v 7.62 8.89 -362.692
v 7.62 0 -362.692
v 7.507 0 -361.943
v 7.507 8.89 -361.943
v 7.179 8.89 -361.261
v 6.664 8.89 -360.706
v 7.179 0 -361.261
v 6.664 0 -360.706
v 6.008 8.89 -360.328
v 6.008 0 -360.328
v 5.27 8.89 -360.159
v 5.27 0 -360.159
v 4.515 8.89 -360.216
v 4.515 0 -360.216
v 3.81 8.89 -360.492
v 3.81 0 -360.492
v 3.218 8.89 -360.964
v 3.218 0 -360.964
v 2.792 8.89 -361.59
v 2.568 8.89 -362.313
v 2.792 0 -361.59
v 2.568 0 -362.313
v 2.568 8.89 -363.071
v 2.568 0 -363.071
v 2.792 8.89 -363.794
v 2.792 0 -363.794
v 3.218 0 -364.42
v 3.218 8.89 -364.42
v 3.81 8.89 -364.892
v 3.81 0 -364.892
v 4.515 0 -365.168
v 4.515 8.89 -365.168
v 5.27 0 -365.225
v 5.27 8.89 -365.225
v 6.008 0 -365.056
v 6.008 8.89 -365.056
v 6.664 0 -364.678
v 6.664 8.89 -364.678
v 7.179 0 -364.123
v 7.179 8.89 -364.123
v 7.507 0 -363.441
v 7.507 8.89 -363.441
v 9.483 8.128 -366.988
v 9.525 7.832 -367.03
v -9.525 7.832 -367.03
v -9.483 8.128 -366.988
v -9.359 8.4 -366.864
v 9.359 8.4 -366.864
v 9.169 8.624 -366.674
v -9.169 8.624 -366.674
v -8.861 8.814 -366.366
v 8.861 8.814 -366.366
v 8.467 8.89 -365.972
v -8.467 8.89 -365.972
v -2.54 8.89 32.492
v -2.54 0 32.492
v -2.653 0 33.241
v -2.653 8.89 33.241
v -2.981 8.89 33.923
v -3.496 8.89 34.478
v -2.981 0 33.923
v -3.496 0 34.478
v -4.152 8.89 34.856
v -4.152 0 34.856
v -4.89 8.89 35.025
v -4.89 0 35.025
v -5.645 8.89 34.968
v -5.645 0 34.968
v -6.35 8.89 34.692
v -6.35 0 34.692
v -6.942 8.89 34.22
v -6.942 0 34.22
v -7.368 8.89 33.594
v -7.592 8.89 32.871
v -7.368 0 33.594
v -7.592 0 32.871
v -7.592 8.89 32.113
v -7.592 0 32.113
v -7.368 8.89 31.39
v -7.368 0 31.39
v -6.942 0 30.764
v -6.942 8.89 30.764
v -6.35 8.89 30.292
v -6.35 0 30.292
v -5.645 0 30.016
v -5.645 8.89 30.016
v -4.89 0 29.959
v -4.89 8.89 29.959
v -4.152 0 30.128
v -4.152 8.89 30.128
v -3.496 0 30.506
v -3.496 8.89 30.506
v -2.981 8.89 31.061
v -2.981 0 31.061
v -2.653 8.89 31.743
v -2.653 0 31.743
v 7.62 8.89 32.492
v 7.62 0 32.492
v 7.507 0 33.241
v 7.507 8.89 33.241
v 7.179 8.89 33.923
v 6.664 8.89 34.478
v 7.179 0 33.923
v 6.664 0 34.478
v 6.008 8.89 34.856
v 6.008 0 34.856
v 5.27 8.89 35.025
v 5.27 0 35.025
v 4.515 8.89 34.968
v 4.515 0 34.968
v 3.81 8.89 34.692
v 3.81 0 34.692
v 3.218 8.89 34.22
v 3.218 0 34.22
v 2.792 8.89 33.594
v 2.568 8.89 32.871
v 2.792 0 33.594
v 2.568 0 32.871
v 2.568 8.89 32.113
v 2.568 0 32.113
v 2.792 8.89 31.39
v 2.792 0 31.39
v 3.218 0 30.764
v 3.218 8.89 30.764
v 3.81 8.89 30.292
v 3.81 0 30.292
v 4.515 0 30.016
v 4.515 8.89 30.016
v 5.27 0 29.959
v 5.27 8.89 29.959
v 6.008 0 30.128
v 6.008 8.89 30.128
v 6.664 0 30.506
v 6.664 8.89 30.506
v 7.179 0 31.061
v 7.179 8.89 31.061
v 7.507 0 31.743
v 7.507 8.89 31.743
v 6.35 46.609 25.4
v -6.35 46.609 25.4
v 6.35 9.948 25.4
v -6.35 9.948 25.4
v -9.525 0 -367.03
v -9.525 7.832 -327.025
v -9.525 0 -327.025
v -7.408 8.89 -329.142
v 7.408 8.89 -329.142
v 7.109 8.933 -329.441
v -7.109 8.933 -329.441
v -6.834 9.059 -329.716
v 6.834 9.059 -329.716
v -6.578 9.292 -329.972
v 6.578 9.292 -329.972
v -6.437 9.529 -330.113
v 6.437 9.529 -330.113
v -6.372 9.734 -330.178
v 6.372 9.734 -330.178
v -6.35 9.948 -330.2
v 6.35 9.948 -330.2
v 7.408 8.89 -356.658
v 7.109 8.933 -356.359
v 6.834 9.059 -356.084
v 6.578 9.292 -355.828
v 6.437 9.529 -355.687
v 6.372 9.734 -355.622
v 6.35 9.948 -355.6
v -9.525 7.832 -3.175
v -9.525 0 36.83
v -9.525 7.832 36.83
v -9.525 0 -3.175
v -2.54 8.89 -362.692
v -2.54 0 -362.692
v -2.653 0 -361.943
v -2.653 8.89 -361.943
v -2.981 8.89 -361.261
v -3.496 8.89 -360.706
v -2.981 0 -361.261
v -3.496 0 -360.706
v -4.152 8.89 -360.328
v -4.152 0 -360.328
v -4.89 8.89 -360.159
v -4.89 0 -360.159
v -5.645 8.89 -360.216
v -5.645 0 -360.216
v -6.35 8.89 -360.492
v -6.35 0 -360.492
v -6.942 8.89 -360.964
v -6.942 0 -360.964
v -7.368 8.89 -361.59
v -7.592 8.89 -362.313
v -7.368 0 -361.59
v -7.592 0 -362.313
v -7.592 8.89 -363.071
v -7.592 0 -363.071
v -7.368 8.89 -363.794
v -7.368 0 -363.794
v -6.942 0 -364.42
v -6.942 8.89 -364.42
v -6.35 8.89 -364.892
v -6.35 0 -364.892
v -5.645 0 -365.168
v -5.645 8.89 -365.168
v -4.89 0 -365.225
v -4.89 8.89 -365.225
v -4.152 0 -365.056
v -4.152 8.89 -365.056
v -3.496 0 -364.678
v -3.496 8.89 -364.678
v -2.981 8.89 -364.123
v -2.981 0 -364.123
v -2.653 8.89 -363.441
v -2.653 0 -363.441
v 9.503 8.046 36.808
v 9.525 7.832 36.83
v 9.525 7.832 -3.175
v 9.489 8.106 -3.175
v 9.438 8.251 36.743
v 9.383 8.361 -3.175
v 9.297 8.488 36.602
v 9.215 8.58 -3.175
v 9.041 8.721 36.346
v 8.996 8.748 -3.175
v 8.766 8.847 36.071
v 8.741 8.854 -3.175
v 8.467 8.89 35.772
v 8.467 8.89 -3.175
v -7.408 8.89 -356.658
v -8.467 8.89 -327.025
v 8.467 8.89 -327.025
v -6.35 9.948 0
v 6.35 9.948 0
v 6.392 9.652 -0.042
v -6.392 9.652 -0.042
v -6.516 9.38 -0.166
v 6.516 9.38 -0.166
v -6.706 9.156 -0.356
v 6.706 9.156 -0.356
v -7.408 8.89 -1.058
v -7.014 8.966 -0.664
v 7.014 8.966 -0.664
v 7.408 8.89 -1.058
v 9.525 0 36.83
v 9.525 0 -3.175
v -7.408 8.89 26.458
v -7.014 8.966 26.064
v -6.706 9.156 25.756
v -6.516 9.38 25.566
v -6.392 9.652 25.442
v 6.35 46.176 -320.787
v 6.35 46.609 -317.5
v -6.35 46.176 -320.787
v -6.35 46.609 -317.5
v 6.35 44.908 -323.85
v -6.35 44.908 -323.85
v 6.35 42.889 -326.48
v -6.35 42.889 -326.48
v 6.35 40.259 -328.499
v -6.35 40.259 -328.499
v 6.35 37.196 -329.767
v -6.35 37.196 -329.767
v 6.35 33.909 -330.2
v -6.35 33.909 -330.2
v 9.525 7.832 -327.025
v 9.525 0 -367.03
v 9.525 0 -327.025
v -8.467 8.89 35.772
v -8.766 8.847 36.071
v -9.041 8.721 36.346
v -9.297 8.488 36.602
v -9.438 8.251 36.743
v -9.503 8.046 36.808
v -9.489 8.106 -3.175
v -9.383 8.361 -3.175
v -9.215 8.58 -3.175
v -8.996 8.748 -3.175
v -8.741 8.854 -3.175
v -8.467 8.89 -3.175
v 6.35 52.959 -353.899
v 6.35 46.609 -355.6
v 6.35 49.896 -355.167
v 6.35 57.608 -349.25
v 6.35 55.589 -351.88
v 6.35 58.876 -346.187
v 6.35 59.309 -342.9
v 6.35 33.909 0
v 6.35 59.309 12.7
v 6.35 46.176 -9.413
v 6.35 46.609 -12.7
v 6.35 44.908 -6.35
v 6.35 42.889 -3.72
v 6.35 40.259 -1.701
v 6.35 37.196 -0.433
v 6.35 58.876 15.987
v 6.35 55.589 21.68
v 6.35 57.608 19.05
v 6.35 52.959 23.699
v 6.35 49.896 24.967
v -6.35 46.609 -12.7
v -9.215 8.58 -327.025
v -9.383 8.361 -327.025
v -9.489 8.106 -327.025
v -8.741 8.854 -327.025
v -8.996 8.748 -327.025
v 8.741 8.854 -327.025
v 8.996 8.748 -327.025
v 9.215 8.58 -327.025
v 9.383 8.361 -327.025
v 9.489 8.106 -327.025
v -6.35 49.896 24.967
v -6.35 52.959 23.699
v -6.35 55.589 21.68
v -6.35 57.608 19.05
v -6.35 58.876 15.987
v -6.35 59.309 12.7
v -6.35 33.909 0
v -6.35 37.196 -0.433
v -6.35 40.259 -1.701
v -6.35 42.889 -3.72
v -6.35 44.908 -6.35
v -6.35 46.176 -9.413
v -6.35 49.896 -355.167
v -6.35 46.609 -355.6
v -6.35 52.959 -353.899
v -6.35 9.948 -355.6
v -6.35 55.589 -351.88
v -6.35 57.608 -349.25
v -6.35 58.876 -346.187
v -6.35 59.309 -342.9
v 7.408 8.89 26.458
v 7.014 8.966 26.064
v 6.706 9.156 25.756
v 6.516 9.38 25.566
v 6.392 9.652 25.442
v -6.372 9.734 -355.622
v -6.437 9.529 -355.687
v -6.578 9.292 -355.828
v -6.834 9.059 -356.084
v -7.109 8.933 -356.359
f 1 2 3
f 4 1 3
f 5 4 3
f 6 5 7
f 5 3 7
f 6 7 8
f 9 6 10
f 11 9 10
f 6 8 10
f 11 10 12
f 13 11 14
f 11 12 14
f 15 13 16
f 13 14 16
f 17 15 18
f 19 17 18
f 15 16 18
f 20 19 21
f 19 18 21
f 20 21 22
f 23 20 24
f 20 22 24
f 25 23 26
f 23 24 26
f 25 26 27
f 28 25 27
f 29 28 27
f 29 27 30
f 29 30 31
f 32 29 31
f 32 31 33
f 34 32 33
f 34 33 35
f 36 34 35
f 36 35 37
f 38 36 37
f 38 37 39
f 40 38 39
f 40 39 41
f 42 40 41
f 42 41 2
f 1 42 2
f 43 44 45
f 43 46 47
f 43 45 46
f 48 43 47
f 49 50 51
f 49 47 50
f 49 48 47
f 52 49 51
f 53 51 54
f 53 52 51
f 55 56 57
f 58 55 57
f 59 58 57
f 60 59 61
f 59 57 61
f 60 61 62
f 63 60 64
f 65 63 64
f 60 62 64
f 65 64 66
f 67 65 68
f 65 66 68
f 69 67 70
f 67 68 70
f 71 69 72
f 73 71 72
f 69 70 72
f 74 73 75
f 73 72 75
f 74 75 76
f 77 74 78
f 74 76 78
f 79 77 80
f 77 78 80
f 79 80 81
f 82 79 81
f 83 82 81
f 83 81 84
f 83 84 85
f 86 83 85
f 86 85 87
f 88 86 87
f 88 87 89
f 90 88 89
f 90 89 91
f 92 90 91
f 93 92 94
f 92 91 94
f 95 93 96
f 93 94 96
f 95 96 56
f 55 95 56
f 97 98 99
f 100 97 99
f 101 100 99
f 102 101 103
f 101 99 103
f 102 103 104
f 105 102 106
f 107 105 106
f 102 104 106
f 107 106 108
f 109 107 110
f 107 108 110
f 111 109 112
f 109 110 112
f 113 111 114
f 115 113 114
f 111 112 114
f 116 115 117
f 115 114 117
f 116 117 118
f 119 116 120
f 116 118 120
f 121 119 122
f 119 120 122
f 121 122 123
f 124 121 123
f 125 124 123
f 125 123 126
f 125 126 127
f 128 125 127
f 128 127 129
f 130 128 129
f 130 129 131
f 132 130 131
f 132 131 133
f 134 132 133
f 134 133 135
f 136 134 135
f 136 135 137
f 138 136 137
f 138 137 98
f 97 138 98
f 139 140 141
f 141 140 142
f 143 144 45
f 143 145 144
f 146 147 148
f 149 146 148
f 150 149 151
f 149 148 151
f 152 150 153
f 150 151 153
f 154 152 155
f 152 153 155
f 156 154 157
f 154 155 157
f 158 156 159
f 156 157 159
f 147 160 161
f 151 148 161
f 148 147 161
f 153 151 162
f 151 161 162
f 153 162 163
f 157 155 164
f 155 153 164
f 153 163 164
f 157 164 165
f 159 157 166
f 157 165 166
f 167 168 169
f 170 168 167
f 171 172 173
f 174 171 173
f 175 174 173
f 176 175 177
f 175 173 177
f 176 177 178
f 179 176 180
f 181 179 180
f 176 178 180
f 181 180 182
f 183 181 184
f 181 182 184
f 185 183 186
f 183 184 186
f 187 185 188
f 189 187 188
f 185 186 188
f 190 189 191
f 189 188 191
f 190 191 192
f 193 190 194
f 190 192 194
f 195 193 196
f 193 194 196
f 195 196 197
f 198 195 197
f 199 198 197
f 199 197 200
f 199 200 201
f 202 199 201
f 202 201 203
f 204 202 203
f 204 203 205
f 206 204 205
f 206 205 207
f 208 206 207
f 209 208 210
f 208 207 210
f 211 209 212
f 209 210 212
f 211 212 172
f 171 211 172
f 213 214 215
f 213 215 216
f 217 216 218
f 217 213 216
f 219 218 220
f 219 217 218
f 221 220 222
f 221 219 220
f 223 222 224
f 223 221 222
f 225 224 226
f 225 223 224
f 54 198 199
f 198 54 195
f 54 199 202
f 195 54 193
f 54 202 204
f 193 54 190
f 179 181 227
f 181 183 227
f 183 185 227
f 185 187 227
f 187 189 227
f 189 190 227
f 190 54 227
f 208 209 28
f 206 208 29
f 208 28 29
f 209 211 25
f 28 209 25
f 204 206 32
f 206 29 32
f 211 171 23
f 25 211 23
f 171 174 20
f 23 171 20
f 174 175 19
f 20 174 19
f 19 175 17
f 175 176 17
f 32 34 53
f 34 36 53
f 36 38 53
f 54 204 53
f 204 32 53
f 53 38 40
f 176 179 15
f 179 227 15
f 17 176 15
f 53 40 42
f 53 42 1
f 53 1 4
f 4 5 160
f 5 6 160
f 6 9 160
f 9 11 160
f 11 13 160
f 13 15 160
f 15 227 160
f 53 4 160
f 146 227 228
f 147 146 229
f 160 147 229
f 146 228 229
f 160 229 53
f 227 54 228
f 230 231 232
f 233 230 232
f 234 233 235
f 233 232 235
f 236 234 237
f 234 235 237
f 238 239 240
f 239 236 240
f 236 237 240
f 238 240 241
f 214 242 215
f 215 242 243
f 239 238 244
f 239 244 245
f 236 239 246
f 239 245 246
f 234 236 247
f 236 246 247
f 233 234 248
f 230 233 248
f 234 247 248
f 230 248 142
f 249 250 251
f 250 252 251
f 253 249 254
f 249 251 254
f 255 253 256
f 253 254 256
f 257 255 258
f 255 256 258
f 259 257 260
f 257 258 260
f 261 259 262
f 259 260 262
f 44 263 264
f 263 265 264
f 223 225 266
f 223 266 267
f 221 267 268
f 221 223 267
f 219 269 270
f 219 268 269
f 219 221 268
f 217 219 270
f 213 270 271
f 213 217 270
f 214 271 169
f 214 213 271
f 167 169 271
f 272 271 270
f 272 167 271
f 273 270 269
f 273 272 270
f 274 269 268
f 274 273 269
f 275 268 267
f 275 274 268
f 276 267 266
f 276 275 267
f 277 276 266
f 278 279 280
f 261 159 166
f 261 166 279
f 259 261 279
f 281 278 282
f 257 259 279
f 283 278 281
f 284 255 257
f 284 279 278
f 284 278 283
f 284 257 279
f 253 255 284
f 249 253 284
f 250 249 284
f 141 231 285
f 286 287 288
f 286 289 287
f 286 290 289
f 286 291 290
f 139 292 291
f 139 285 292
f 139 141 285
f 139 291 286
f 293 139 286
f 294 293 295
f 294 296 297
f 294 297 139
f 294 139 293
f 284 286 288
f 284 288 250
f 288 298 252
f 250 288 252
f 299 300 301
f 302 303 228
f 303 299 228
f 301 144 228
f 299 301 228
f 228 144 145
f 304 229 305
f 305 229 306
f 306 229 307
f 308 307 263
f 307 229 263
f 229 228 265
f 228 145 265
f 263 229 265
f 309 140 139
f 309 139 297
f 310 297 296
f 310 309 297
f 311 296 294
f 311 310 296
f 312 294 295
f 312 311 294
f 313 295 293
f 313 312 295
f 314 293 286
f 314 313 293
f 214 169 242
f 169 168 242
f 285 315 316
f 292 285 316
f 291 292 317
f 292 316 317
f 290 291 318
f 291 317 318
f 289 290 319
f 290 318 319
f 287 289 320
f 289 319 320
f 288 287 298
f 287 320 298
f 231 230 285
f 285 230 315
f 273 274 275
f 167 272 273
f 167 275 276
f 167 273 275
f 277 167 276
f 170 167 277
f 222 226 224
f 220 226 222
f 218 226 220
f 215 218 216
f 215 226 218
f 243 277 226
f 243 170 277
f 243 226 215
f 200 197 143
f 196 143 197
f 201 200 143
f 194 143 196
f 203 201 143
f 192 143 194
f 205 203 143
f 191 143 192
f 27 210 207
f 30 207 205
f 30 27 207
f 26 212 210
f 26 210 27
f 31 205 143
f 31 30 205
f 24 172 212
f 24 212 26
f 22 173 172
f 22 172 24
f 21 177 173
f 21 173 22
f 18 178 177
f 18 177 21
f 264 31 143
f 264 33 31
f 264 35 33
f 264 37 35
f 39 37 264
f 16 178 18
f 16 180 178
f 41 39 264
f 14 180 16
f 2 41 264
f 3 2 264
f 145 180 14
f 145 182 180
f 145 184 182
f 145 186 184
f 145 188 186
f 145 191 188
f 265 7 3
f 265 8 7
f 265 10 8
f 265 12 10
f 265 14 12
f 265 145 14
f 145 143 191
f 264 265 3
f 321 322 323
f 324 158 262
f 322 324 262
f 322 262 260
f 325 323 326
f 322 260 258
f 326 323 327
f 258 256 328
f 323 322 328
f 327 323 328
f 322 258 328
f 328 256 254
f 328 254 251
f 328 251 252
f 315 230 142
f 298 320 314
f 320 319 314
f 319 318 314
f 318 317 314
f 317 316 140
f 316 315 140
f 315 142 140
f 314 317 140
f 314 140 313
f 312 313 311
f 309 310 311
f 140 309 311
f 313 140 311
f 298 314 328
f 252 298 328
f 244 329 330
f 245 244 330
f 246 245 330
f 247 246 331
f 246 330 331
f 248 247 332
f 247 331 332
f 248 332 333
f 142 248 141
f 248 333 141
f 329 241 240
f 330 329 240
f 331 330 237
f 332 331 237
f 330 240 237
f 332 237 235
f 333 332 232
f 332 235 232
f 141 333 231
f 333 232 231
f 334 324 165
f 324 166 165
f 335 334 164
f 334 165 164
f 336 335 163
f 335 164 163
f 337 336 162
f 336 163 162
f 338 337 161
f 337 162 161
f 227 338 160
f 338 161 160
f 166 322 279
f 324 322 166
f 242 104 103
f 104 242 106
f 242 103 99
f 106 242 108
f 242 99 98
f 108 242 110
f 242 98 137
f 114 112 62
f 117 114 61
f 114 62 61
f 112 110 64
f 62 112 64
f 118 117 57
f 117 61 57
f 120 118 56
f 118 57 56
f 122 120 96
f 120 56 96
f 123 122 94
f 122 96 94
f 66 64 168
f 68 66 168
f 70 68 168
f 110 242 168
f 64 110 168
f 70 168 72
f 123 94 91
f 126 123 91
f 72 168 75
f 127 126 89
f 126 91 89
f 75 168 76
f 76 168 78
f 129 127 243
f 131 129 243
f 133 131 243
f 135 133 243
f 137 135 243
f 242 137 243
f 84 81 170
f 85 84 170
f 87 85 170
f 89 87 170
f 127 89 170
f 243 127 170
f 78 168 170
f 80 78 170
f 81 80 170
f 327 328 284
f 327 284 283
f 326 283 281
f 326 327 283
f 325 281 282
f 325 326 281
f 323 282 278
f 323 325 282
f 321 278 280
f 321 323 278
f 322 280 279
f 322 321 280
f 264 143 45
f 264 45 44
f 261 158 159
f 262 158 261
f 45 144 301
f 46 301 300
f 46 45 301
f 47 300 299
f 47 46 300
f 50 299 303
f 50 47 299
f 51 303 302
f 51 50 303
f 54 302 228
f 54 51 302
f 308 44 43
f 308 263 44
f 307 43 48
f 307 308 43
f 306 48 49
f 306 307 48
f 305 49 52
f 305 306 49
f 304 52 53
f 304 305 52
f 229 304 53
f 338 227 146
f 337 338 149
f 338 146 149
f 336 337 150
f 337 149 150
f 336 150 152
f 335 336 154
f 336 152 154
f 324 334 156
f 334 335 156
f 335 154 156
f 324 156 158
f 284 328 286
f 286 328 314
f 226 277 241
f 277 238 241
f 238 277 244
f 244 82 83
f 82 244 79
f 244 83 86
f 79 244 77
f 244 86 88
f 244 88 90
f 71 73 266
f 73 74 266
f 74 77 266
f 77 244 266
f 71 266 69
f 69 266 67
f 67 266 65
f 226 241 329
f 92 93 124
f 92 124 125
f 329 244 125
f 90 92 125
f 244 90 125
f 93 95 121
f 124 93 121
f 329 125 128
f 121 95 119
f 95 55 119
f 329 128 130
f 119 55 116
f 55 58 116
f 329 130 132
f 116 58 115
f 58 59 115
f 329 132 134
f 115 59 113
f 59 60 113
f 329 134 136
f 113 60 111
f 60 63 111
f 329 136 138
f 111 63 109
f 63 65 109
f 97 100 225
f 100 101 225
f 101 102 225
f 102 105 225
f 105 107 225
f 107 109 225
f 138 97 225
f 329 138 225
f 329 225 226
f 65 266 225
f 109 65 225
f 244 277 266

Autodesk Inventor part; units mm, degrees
ref_plane "YZ Plane" through (0, 0, 0) normal (1, 0, 0) x (0, 1, 0)
ref_plane "XZ Plane" through (0, 0, 0) normal (0, 1, 0) x (-1, 0, 0)
ref_plane "XY Plane" through (0, 0, 0) normal (0, 0, 1) x (1, 0, 0)
sketch "Sketch1" plane through (0, 0, 0) normal (1, 0, 0) x (0, 1, 0)
  line L0 (0, 0) -> (33.909, 0)
  line L1 (59.309, 0) -> (59.309, 12.7)
  line L2 (46.609, 25.4) -> (0, 25.4)
  line L3 (0, 25.4) -> (0, 0)
  line L4 (46.609, -12.7) -> (46.609, -317.5)
  line L5 (59.309, -342.9) -> (59.309, 12.7)
  line L6 (46.609, -355.6) -> (0, -355.6)
  line L7 (0, -355.6) -> (0, -330.2)
  line L8 (0, -330.2) -> (33.909, -330.2)
  arc A0 (59.309, 12.7) -> (46.609, 25.4) centre (46.609, 12.7) ccw
  arc A1 (46.609, -12.7) -> (33.909, 0) centre (33.909, -12.7) ccw
  arc A2 (33.909, -330.2) -> (46.609, -317.5) centre (33.909, -317.5) ccw
  arc A3 (46.609, -355.6) -> (59.309, -342.9) centre (46.609, -342.9) ccw
  dimension "d5" = 25.4
  dimension "d6" = 12.7
  dimension "d7" = 12.7
  dimension "d8" = 12.7
  dimension "d9" = 381
  dimension "d10" = 25.4
  dimension "d11" = 59.309
  dimension "d15" = 59.309
extrude "Extrusion1" add sketch "Sketch1" along normal mid plane 12.7
sketch "Sketch2" plane through (-6.35, 0, 0) normal (0, -1, 0) x (1, 0, 0)
  line L0 (0, -355.6) -> (12.7, -355.6) projected
  line L1 (0, -330.2) -> (12.7, -330.2) projected
  line L2 (12.7, -355.6) -> (0, -355.6)
  line L3 (0, -355.6) -> (0, -330.2)
  line L4 (0, -330.2) -> (12.7, -330.2)
  line L5 (12.7, -330.2) -> (12.7, -355.6)
  line L6 (-3.175, -327.025) -> (15.875, -327.025)
  line L7 (15.875, -327.025) -> (15.875, -358.775)
  line L8 (-3.175, -358.775) -> (-3.175, -327.025)
  line L9 (12.7, -342.9) -> (0, -342.9) projected
  line L10 (-3.175, -327.025) -> (15.875, -358.775) construction
  line L11 (15.875, -327.025) -> (-3.175, -358.775) construction
  line L12 (15.875, -364.49) -> (15.875, -358.775)
  line L13 (-3.175, -358.775) -> (-3.175, -364.49)
  line L14 (-3.175, -367.03) -> (15.875, -367.03)
  line L15 (15.875, -367.03) -> (15.875, -364.49)
  line L16 (-3.175, -364.49) -> (-3.175, -367.03)
  circle A0 centre (1.27, -362.692) radius 2.54
  line L17 (6.35, -367.03) -> (6.35, -357.004) construction
  circle A1 centre (11.43, -362.692) radius 2.54
  line L18 (42.8308, -165.1) -> (-55.1073, -165.1) construction
  line L19 (0, 25.4) -> (12.7, 25.4)
  line L20 (0, 0) -> (12.7, 0)
  line L21 (12.7, 25.4) -> (0, 25.4)
  line L22 (0, 25.4) -> (0, 0)
  line L23 (0, 0) -> (12.7, 0)
  line L24 (12.7, 0) -> (12.7, 25.4)
  line L25 (-3.175, -3.175) -> (15.875, -3.175)
  line L26 (15.875, -3.175) -> (15.875, 28.575)
  line L27 (-3.175, 28.575) -> (-3.175, -3.175)
  line L28 (12.7, 12.7) -> (0, 12.7)
  line L29 (-3.175, -3.175) -> (15.875, 28.575) construction
  line L30 (15.875, -3.175) -> (-3.175, 28.575) construction
  line L31 (15.875, 34.29) -> (15.875, 28.575)
  line L32 (-3.175, 28.575) -> (-3.175, 34.29)
  line L33 (-3.175, 36.83) -> (15.875, 36.83)
  line L34 (15.875, 36.83) -> (15.875, 34.29)
  line L35 (-3.175, 34.29) -> (-3.175, 36.83)
  circle A2 centre (1.27, 32.492) radius 2.54
  line L36 (6.35, 36.83) -> (6.35, 26.804) construction
  circle A3 centre (11.43, 32.492) radius 2.54
  point P0 (0, 25.4)
  point P1 (12.7, 25.4)
  point P2 (6.35, -342.9)
  point P3 (6.35, 12.7)
  dimension "d16" = 19.05
  dimension "d17" = 31.75
  dimension "d27" = 5.08
  dimension "d28" = 4.445
extrude "Extrusion2" add sketch "Sketch2" against normal blind 8.89
fillet "Fillet1" radius 1.0583 14 edges at (0, 8.89, 36.83) (-9.525, 8.89, 16.8275) (9.525, 8.89, 16.8275) (-9.525, 8.89, -347.0275) (0, 8.89, -367.03) (9.525, 8.89, -347.0275) (6.35, 8.89, -342.9) (-6.35, 8.89, -342.9) (0, 8.89, -355.6) (0, 8.89, -330.2) (0, 8.89, 25.4) (-6.35, 8.89, 12.7) (0, 8.89, 0) (6.35, 8.89, 12.7)
properties part number "IndexRailOutSides" material "Polycarbonate, Clear"
